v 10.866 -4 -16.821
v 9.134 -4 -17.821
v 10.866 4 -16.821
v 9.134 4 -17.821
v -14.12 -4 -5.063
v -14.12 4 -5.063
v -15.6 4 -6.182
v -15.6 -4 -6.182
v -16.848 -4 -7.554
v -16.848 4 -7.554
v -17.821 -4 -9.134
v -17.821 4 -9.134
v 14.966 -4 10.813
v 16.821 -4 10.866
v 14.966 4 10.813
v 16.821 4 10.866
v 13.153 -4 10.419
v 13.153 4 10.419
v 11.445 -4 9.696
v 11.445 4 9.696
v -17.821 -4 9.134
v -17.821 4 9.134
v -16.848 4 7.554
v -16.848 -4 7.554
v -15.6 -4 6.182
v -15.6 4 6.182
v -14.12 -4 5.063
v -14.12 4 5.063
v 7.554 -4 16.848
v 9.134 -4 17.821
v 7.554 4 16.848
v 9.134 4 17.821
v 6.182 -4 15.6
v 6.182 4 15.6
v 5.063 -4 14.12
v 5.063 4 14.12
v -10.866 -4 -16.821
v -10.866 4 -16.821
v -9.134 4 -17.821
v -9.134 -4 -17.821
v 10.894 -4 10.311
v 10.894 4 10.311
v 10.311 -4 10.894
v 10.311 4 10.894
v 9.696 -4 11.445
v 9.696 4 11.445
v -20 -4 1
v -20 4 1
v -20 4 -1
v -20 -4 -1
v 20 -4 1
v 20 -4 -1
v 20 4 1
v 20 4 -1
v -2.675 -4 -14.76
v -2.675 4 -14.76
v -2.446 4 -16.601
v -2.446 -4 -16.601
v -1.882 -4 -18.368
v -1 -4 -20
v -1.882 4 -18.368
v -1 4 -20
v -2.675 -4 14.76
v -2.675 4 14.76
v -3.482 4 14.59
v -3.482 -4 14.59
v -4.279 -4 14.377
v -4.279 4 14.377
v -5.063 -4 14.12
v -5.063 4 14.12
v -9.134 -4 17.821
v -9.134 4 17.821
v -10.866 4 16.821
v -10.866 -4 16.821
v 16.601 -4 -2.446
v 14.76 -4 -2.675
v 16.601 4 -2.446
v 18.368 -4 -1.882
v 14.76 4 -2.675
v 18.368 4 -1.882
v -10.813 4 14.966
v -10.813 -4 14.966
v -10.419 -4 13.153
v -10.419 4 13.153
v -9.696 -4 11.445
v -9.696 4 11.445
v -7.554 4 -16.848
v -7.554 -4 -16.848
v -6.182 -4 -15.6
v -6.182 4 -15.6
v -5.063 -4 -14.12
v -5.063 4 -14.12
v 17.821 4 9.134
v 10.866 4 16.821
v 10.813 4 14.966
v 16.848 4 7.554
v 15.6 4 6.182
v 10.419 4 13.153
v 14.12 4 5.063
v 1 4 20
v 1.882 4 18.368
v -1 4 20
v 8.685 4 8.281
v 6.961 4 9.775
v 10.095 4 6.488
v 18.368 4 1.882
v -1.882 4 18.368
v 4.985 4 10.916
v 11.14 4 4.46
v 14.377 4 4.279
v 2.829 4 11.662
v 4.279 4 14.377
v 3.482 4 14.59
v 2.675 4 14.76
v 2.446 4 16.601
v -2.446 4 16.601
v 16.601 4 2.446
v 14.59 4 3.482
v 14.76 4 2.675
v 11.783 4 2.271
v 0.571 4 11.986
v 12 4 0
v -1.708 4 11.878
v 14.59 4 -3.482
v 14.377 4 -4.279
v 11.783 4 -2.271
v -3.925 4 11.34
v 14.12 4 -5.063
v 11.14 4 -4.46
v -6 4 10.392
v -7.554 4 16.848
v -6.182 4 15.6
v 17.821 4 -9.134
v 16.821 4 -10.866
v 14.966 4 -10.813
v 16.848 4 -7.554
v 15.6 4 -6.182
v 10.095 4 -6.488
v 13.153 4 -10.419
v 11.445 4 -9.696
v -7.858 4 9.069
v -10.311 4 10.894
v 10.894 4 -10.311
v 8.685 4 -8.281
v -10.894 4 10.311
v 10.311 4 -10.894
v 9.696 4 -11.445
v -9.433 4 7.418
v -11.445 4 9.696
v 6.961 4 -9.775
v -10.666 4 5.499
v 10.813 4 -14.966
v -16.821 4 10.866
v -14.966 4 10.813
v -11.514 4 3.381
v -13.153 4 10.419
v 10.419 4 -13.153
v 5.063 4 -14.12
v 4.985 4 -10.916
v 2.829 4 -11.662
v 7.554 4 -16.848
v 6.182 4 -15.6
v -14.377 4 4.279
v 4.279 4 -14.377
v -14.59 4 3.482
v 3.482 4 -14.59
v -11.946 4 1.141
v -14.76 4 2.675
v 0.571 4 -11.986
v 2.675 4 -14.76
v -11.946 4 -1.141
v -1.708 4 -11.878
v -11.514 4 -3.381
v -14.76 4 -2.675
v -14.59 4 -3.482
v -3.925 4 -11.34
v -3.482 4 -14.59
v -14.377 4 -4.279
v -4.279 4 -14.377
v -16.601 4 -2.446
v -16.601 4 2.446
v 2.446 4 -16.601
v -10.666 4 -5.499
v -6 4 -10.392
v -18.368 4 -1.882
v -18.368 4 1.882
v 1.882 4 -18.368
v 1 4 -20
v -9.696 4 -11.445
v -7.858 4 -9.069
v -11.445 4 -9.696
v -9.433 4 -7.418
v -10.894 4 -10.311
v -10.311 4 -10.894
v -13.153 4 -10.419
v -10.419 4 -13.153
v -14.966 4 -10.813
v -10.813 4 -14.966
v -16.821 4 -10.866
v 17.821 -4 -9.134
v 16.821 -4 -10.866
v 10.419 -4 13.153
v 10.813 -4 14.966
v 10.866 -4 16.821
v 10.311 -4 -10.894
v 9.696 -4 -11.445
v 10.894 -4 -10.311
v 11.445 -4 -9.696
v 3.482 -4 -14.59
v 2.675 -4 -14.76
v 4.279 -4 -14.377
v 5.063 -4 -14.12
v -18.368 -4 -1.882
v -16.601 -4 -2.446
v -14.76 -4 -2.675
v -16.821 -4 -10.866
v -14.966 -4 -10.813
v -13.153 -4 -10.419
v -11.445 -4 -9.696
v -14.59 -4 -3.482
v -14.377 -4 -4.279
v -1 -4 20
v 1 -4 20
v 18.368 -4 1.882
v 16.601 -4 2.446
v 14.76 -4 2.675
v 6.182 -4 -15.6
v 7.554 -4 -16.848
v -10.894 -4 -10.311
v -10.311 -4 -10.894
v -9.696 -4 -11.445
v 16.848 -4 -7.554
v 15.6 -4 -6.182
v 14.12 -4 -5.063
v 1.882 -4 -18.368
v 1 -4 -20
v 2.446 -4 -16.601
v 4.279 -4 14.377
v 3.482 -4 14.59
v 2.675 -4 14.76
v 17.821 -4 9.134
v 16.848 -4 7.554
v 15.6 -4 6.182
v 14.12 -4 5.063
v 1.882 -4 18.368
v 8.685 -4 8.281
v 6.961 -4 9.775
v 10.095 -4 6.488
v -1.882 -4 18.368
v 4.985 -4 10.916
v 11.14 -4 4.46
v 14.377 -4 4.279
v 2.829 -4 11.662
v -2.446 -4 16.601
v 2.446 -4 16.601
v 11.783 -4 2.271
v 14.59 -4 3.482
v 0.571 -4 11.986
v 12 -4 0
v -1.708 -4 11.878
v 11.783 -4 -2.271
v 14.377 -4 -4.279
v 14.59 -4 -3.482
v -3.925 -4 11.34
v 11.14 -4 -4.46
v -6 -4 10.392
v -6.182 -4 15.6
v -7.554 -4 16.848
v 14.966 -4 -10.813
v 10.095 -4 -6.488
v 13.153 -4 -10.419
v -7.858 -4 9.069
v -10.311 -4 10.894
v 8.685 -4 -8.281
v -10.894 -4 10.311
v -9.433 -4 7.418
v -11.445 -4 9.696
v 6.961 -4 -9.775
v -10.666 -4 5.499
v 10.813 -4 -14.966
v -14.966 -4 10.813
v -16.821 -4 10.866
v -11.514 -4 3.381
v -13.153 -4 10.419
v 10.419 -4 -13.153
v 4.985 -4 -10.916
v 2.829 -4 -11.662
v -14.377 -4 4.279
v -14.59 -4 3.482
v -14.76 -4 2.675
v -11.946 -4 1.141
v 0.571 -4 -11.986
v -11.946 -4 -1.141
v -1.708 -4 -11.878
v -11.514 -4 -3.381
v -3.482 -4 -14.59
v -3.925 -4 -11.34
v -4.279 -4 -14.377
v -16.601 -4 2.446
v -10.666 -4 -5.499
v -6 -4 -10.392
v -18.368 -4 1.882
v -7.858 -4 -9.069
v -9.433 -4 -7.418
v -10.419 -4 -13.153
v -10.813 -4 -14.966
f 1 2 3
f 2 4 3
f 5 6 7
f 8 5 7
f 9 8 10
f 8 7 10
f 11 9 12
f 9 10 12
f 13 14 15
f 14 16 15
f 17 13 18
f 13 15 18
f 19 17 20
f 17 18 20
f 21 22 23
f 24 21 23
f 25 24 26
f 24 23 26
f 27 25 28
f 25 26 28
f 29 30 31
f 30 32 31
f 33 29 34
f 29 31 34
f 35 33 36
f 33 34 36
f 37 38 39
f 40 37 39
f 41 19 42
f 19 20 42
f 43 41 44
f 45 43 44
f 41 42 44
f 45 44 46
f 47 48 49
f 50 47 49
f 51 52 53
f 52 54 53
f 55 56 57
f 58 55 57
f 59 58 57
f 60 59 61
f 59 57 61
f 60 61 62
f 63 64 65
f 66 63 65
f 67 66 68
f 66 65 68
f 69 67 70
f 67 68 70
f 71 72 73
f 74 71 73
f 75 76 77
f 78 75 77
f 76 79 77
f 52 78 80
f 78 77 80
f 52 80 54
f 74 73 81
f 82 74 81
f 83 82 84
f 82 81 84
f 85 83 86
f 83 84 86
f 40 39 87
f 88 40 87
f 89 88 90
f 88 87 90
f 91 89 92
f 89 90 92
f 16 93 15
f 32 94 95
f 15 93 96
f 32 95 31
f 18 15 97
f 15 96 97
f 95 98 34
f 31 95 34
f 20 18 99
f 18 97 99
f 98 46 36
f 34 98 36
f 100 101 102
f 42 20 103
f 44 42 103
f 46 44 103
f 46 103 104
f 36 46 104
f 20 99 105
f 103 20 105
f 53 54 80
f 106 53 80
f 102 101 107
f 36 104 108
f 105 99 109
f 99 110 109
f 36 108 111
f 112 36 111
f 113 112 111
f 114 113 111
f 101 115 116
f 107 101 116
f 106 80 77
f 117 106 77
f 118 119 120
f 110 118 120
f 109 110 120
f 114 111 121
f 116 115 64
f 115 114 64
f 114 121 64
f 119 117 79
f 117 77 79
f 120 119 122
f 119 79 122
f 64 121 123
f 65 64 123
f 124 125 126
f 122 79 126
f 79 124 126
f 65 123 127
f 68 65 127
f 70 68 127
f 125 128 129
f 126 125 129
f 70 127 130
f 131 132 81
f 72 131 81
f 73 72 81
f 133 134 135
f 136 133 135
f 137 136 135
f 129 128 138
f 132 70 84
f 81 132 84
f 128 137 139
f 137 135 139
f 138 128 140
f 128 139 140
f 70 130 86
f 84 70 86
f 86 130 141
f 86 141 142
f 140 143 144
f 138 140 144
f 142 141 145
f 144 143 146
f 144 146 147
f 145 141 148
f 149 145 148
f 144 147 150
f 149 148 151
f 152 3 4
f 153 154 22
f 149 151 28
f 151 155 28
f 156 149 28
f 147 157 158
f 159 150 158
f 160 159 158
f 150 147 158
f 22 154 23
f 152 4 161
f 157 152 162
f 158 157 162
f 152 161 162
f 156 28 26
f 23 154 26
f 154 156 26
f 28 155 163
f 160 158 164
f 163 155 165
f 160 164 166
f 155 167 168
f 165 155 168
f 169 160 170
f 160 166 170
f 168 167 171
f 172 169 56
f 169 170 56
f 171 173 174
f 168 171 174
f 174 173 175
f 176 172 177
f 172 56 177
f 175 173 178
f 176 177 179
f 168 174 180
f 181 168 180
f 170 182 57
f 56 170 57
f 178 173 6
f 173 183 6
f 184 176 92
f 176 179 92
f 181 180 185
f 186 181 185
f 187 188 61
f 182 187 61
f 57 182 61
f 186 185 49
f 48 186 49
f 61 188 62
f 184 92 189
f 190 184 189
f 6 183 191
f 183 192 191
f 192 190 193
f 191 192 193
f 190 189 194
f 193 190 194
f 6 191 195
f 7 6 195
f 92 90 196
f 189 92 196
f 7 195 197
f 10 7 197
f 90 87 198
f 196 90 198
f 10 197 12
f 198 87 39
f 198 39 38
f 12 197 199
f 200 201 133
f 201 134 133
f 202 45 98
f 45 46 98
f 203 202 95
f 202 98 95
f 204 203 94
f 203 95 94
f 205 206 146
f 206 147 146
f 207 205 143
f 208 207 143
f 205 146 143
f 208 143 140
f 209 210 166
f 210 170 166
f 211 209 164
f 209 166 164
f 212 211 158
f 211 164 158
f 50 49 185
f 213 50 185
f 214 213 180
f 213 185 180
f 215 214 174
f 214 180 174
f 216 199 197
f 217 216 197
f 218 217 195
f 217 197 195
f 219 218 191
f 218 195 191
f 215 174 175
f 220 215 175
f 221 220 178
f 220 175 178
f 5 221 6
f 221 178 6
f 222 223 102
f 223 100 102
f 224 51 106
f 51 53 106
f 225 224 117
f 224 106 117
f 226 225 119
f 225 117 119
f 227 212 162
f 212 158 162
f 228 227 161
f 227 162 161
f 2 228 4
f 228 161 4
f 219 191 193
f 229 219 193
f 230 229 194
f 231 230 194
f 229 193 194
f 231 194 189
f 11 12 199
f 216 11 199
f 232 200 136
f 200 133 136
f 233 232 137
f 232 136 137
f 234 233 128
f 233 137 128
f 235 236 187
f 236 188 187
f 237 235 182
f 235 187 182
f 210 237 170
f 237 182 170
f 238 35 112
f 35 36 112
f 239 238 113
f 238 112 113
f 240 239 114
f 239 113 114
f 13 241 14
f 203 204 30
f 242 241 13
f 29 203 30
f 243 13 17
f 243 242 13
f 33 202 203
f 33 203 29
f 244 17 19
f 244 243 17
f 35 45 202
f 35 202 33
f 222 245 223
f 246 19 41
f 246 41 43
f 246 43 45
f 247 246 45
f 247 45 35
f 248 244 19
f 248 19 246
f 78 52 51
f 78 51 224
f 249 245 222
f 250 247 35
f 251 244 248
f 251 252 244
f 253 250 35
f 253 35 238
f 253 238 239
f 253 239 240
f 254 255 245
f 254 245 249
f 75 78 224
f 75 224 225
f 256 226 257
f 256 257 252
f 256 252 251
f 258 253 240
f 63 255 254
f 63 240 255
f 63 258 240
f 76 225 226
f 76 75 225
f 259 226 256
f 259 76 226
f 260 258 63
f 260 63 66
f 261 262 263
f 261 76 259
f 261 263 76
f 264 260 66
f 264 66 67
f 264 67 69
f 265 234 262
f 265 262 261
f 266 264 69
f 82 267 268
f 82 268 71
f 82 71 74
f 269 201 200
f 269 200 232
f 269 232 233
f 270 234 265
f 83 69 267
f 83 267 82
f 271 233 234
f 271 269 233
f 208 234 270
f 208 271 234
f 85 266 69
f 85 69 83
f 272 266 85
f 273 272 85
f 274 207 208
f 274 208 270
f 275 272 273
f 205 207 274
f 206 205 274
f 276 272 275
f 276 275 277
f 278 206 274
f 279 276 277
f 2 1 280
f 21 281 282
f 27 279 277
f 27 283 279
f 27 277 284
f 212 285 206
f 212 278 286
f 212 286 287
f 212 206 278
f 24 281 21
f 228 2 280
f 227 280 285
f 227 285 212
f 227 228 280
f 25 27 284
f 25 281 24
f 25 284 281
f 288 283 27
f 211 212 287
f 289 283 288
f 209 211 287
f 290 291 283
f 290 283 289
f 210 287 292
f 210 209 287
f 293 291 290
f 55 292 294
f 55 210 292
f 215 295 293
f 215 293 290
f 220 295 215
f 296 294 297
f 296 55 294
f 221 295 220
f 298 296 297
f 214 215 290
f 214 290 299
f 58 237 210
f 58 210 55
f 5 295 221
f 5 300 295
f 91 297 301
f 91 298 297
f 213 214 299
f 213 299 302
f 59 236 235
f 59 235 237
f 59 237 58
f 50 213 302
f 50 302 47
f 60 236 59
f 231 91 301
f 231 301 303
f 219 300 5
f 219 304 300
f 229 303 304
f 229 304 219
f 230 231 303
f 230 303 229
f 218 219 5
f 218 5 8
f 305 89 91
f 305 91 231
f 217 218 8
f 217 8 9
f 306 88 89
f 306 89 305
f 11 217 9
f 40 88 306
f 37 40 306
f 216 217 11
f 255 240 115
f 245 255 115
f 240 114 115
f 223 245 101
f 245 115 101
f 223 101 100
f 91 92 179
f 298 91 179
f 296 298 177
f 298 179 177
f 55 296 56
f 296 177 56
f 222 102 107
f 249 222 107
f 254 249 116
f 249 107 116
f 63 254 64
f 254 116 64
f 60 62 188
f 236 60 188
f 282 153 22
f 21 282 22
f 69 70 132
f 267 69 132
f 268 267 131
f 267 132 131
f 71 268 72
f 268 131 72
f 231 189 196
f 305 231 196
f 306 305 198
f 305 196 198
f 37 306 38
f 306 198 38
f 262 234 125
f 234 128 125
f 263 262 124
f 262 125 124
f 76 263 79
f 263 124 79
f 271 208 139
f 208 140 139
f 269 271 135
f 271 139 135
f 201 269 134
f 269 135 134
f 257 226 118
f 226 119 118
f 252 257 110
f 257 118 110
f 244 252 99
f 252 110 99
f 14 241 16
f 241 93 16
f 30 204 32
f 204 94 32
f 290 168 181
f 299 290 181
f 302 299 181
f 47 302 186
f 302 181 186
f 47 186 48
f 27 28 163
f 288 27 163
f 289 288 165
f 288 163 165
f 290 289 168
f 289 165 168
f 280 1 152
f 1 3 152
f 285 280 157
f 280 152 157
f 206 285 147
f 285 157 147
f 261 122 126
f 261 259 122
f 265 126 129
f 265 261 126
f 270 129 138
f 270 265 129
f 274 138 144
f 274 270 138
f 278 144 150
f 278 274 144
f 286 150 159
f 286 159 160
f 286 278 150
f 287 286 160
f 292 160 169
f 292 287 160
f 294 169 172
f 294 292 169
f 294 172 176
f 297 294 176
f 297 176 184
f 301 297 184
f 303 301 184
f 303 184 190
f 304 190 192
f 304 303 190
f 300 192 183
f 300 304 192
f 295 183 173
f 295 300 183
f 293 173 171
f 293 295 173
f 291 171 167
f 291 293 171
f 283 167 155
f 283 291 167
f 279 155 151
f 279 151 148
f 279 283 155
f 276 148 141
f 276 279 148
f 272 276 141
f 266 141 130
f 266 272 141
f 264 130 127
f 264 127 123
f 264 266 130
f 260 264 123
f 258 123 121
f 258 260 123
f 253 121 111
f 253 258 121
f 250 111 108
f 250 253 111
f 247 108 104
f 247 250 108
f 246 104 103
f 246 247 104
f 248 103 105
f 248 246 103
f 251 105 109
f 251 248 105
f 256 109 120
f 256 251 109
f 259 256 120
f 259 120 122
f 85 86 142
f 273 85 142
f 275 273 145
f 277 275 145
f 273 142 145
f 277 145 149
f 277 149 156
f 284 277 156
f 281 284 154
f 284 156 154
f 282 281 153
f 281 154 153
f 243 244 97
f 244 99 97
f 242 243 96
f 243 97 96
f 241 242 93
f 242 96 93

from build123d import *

# Parameters (mm, degrees)
SKETCH1_R           = 12
BOSS_EXTRUDE1_DEPTH = 4


with BuildPart() as part:
    # Sketch1 → Boss-Extrude1 (new body, symmetric)
    with BuildSketch(Plane(origin=(0, 0, 0), x_dir=(1, 0, 0), z_dir=(0, 1, 0))):
        with BuildLine():
            Line((-1, 20), (1, 20))
            ThreePointArc((1, 20), (2.204975942, 17.497232023), (2.675, 14.759551992))
            ThreePointArc((2.675, 14.759551992), (3.882285677, 14.488887394), (5.063158041, 14.119646973))
            ThreePointArc((5.063158041, 14.119646973), (6.839050831, 16.255535399), (9.133974596, 17.820508076))
            Line((9.133974596, 17.820508076), (10.866025404, 16.820508076))
            ThreePointArc((10.866025404, 16.820508076), (10.658181192, 14.050559457), (9.696393951, 11.444646973))
            ThreePointArc((9.696393951, 11.444646973), (10.606601718, 10.606601718), (11.444646973, 9.696393951))
            ThreePointArc((11.444646973, 9.696393951), (14.050559457, 10.658181192), (16.820508076, 10.866025404))
            Line((16.820508076, 10.866025404), (17.820508076, 9.133974596))
            ThreePointArc((17.820508076, 9.133974596), (16.255535399, 6.839050831), (14.119646973, 5.063158041))
            ThreePointArc((14.119646973, 5.063158041), (14.488887394, 3.882285677), (14.759551992, 2.675))
            ThreePointArc((14.759551992, 2.675), (17.497232023, 2.204975942), (20, 1))
            Line((20, 1), (20, -1))
            ThreePointArc((20, -1), (17.497232023, -2.204975942), (14.759551992, -2.675))
            ThreePointArc((14.759551992, -2.675), (14.488887394, -3.882285677), (14.119646973, -5.063158041))
            ThreePointArc((14.119646973, -5.063158041), (16.255535399, -6.839050831), (17.820508076, -9.133974596))
            Line((17.820508076, -9.133974596), (16.820508076, -10.866025404))
            ThreePointArc((16.820508076, -10.866025404), (14.050559457, -10.658181192), (11.444646973, -9.696393951))
            ThreePointArc((11.444646973, -9.696393951), (10.606601718, -10.606601718), (9.696393951, -11.444646973))
            ThreePointArc((9.696393951, -11.444646973), (10.658181192, -14.050559457), (10.866025404, -16.820508076))
            Line((10.866025404, -16.820508076), (9.133974596, -17.820508076))
            ThreePointArc((9.133974596, -17.820508076), (6.839050831, -16.255535399), (5.063158041, -14.119646973))
            ThreePointArc((5.063158041, -14.119646973), (3.882285677, -14.488887394), (2.675, -14.759551992))
            ThreePointArc((2.675, -14.759551992), (2.204975942, -17.497232023), (1, -20))
            Line((1, -20), (-1, -20))
            ThreePointArc((-1, -20), (-2.204975942, -17.497232023), (-2.675, -14.759551992))
            ThreePointArc((-2.675, -14.759551992), (-3.882285677, -14.488887394), (-5.063158041, -14.119646973))
            ThreePointArc((-5.063158041, -14.119646973), (-6.839050831, -16.255535399), (-9.133974596, -17.820508076))
            Line((-9.133974596, -17.820508076), (-10.866025404, -16.820508076))
            ThreePointArc((-10.866025404, -16.820508076), (-10.658181192, -14.050559457), (-9.696393951, -11.444646973))
            ThreePointArc((-9.696393951, -11.444646973), (-10.606601718, -10.606601718), (-11.444646973, -9.696393951))
            ThreePointArc((-11.444646973, -9.696393951), (-14.050559457, -10.658181192), (-16.820508076, -10.866025404))
            Line((-16.820508076, -10.866025404), (-17.820508076, -9.133974596))
            ThreePointArc((-17.820508076, -9.133974596), (-16.255535399, -6.839050831), (-14.119646973, -5.063158041))
            ThreePointArc((-14.119646973, -5.063158041), (-14.488887394, -3.882285677), (-14.759551992, -2.675))
            ThreePointArc((-14.759551992, -2.675), (-17.497232023, -2.204975942), (-20, -1))
            Line((-20, -1), (-20, 1))
            ThreePointArc((-20, 1), (-17.497232023, 2.204975942), (-14.759551992, 2.675))
            ThreePointArc((-14.759551992, 2.675), (-14.488887394, 3.882285677), (-14.119646973, 5.063158041))
            ThreePointArc((-14.119646973, 5.063158041), (-16.255535399, 6.839050831), (-17.820508076, 9.133974596))
            Line((-17.820508076, 9.133974596), (-16.820508076, 10.866025404))
            ThreePointArc((-16.820508076, 10.866025404), (-14.050559457, 10.658181192), (-11.444646973, 9.696393951))
            ThreePointArc((-11.444646973, 9.696393951), (-10.606601718, 10.606601718), (-9.696393951, 11.444646973))
            ThreePointArc((-9.696393951, 11.444646973), (-10.658181192, 14.050559457), (-10.866025404, 16.820508076))
            Line((-10.866025404, 16.820508076), (-9.133974596, 17.820508076))
            ThreePointArc((-9.133974596, 17.820508076), (-6.839050831, 16.255535399), (-5.063158041, 14.119646973))
            ThreePointArc((-5.063158041, 14.119646973), (-3.882285677, 14.488887394), (-2.675, 14.759551992))
            ThreePointArc((-2.675, 14.759551992), (-2.204975942, 17.497232023), (-1, 20))
        make_face()
        Circle(SKETCH1_R, mode=Mode.SUBTRACT)
    extrude(amount=BOSS_EXTRUDE1_DEPTH, both=True)


solid = part.part
